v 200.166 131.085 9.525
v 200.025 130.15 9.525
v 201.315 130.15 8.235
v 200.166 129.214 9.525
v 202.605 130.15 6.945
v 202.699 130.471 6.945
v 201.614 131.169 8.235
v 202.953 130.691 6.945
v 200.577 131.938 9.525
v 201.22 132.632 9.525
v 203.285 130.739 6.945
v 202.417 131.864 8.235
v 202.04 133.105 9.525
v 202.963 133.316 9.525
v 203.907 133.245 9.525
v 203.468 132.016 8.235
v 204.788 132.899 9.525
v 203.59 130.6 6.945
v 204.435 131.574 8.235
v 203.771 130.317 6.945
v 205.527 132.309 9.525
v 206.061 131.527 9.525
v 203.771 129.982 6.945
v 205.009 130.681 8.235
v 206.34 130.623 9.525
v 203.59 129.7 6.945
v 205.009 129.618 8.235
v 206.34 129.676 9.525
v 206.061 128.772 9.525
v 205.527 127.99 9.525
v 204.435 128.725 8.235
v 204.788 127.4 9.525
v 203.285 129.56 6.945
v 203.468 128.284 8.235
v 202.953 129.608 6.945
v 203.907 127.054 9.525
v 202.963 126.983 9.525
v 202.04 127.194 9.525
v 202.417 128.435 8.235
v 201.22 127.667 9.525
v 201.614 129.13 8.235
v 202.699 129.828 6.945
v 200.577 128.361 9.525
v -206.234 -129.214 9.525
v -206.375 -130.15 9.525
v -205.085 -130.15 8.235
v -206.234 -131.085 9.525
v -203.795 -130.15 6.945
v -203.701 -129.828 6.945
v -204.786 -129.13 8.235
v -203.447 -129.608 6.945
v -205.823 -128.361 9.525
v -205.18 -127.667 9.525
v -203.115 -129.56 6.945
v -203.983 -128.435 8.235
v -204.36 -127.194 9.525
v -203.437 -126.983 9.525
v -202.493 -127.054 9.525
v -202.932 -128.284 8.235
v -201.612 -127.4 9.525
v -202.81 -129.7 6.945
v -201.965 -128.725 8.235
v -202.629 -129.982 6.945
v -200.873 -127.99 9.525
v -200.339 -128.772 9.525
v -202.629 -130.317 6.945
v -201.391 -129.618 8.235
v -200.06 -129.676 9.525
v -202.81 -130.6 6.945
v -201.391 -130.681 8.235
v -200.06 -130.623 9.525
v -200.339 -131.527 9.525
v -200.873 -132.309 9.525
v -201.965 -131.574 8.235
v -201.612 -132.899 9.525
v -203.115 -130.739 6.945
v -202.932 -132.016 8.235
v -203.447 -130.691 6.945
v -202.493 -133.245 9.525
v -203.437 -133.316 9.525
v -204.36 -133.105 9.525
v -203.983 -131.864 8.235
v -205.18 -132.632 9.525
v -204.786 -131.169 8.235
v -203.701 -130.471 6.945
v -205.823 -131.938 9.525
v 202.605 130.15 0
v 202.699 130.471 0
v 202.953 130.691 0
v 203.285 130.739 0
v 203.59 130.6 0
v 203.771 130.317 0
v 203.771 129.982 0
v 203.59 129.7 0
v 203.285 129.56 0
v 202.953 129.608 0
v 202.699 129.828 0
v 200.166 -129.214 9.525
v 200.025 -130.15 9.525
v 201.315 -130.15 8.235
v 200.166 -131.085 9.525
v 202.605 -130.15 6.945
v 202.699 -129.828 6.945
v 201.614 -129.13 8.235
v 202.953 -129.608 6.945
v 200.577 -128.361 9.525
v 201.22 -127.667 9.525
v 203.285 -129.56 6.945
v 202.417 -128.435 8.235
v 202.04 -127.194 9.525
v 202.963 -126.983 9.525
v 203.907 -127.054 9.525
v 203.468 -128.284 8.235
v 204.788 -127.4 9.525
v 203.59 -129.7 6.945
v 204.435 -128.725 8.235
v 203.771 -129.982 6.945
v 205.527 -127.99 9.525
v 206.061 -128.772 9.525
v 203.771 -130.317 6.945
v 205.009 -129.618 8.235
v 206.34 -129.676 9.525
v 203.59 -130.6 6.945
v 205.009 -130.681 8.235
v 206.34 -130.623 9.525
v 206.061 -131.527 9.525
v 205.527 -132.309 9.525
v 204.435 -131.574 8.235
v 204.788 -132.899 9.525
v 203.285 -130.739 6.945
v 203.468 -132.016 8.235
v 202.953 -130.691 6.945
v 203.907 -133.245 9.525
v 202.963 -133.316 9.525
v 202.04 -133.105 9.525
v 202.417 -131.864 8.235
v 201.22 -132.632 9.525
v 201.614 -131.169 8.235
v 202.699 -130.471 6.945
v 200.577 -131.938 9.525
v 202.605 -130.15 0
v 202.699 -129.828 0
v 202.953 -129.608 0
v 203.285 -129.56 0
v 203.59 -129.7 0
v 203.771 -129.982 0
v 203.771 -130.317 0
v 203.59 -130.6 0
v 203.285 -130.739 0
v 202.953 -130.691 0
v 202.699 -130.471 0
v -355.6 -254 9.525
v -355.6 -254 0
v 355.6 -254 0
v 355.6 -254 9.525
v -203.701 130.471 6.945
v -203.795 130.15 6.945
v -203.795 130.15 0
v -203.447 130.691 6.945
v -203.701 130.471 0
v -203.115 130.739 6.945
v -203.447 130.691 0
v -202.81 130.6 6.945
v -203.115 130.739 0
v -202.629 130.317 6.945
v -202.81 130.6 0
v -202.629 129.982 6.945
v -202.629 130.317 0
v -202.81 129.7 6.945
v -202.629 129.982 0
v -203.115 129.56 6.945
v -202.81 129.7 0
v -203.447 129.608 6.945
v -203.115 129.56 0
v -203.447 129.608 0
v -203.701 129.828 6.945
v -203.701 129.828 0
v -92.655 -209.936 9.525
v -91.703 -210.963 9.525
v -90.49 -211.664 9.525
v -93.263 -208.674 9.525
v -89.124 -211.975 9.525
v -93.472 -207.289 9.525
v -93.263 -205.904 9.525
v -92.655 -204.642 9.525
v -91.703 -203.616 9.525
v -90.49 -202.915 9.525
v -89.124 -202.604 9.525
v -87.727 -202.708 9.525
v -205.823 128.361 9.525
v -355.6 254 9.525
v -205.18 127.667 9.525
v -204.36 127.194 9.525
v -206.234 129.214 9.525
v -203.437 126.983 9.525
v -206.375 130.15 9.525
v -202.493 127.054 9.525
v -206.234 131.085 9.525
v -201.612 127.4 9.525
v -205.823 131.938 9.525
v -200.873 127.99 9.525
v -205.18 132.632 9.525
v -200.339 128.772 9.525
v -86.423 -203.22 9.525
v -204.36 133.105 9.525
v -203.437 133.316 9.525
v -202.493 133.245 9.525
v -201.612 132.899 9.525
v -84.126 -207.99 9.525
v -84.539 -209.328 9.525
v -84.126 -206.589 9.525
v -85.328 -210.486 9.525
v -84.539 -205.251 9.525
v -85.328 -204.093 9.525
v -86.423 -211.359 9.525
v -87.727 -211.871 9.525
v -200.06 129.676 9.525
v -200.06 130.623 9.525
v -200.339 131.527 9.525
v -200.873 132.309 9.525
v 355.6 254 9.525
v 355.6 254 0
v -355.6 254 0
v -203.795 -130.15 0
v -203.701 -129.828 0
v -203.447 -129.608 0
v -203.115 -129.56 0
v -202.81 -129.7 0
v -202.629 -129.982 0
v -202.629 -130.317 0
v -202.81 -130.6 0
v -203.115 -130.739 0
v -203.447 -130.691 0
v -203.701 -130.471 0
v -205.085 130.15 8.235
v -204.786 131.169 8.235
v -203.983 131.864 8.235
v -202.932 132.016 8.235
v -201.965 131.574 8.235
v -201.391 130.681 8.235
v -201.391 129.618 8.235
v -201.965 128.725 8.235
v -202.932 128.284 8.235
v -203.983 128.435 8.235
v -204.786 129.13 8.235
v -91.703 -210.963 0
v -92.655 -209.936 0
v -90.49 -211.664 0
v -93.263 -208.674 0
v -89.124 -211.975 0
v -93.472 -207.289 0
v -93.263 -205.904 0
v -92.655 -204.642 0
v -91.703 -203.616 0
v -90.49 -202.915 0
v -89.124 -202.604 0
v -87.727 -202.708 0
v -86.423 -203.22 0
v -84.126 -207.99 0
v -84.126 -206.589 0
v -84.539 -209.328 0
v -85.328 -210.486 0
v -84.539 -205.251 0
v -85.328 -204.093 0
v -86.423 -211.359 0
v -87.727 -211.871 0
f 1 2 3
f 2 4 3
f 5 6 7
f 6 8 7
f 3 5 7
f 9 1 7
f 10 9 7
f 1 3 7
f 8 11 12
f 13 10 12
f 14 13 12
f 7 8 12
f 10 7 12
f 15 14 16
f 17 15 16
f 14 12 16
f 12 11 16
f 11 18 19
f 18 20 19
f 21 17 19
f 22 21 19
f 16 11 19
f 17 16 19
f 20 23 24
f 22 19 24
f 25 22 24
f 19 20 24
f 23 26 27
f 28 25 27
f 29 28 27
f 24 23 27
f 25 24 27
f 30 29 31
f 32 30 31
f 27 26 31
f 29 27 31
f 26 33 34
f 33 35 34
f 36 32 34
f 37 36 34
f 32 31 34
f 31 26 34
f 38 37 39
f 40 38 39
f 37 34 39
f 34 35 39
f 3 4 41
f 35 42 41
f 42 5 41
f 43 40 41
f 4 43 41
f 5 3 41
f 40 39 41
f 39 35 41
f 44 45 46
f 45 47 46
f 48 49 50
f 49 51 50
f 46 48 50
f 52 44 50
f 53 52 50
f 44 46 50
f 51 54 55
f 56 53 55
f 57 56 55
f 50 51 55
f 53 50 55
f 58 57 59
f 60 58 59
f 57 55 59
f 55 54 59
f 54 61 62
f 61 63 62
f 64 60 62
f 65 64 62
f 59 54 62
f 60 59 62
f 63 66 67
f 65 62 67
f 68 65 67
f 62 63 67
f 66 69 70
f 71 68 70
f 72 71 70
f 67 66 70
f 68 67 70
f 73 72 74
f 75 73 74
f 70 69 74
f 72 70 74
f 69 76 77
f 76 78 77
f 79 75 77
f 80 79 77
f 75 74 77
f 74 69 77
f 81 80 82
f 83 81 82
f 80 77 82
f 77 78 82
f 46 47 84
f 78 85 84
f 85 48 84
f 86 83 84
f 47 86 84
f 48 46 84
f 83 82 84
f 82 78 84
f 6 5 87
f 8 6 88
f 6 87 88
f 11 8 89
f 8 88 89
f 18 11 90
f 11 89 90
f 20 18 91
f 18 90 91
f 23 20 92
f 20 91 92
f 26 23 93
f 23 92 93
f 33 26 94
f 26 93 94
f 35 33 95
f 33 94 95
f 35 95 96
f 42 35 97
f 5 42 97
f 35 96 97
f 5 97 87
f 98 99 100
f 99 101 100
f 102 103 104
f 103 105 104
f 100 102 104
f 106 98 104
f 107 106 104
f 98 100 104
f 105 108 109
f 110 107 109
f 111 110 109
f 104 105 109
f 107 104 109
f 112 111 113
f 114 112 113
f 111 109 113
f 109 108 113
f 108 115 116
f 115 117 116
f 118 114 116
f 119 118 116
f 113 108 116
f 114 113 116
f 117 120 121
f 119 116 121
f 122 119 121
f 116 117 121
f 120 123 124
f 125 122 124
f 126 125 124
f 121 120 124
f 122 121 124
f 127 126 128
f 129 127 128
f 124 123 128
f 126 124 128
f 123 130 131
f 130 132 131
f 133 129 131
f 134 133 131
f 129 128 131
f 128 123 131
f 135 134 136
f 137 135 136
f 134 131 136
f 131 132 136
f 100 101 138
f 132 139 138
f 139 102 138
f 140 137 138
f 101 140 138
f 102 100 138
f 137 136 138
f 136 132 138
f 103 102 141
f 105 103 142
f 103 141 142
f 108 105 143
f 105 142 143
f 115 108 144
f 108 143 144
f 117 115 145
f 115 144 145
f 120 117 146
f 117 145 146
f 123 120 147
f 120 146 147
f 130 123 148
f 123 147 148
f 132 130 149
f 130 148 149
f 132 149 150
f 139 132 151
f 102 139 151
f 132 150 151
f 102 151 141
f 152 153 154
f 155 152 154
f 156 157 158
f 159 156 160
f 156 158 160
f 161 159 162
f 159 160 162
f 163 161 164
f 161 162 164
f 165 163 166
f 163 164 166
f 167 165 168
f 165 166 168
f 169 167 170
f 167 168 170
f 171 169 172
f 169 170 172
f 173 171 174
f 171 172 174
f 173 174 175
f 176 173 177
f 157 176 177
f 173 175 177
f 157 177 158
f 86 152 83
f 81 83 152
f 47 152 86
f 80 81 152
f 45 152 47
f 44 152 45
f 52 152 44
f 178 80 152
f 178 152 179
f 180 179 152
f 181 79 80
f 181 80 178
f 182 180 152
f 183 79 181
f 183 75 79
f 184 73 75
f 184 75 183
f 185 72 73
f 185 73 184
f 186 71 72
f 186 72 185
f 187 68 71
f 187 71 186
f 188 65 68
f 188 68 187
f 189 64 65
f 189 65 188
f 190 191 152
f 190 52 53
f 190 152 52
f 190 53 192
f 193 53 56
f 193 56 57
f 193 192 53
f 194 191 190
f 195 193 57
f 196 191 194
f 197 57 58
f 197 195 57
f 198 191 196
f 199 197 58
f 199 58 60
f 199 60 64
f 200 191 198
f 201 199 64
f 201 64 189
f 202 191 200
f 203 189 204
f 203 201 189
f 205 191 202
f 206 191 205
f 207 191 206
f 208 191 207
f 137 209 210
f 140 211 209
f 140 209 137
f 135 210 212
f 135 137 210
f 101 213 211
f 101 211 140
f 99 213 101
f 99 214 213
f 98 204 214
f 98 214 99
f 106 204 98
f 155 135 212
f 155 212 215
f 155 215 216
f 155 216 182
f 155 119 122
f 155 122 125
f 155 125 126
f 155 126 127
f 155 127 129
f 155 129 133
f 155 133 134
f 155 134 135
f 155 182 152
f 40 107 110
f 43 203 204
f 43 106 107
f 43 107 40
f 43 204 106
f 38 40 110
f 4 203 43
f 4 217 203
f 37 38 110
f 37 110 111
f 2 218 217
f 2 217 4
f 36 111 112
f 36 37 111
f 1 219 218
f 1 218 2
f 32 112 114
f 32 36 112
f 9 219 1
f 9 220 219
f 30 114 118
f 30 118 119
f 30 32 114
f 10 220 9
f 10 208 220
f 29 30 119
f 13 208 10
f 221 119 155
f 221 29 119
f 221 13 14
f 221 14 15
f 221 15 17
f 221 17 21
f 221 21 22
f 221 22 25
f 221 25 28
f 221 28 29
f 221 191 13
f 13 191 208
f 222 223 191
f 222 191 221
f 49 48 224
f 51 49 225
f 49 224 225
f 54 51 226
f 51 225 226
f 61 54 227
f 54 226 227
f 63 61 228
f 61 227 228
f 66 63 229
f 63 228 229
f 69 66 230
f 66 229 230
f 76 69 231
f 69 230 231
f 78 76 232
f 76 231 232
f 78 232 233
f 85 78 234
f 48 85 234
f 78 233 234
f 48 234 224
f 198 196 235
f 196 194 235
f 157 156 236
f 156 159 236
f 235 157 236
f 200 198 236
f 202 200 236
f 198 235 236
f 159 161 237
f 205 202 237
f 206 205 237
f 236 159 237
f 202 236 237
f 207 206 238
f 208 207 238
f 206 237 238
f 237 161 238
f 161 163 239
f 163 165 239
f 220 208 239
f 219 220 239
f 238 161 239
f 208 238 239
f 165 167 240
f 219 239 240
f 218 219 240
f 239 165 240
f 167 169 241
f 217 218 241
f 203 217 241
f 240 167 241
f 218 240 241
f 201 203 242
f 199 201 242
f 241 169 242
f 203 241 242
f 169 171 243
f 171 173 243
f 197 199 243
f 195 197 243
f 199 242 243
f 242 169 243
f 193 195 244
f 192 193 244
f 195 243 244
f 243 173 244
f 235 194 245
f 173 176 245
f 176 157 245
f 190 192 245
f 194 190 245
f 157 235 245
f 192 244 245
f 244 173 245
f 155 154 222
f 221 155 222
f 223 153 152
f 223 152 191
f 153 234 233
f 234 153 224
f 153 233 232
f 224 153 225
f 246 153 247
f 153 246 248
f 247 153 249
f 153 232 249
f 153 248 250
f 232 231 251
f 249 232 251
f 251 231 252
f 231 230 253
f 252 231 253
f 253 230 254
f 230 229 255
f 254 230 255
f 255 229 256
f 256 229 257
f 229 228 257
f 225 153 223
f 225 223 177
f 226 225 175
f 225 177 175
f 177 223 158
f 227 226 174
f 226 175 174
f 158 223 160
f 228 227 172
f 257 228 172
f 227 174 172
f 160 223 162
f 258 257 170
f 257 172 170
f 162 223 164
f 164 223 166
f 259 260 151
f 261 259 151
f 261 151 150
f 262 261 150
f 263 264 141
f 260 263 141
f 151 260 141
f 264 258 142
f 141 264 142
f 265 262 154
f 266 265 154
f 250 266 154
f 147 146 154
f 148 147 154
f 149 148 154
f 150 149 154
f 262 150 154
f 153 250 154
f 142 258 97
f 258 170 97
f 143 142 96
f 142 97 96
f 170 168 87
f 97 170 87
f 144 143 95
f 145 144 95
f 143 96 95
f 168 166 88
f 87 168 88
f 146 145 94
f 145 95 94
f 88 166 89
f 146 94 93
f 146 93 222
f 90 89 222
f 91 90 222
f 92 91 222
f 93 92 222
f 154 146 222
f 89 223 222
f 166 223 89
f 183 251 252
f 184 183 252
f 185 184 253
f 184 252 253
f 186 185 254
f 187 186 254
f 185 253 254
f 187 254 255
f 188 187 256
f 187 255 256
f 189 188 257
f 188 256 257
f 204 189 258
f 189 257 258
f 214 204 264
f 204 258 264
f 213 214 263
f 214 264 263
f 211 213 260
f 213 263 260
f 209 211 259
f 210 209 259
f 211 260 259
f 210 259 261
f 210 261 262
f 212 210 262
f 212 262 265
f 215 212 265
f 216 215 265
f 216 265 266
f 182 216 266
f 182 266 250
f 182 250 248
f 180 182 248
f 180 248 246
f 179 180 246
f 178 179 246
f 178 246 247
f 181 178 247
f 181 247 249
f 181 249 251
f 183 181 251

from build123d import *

# Parameters (mm, degrees)
F0_W           = 711.2
F0_H           = 508
F1_DEPTH       = 9.525
F3_D           = 1.190625
F3_CSINK_D     = 6.35
F3_CSINK_ANGLE = 90
F5_D           = 9.398


with BuildPart() as f1:
    # F0 (on Top) → F1 (new body)
    with BuildSketch(Plane.XY):
        Rectangle(F0_W, F0_H)
    extrude(amount=F1_DEPTH)

    # F3 (through all)
    with Locations(Plane.XY.offset(9.525)):
        with Locations((-203.2, 130.1496), (-203.2, -130.1496), (203.2, 130.1496), (203.2, -130.1496)):
            CounterSinkHole(F3_D / 2, F3_CSINK_D / 2, counter_sink_angle=F3_CSINK_ANGLE)

    # F5 (through all)
    with Locations(Plane.XY.offset(9.525)):
        with Locations((-88.773, -207.2894)):
            Hole(F5_D / 2)


solid = f1.part
